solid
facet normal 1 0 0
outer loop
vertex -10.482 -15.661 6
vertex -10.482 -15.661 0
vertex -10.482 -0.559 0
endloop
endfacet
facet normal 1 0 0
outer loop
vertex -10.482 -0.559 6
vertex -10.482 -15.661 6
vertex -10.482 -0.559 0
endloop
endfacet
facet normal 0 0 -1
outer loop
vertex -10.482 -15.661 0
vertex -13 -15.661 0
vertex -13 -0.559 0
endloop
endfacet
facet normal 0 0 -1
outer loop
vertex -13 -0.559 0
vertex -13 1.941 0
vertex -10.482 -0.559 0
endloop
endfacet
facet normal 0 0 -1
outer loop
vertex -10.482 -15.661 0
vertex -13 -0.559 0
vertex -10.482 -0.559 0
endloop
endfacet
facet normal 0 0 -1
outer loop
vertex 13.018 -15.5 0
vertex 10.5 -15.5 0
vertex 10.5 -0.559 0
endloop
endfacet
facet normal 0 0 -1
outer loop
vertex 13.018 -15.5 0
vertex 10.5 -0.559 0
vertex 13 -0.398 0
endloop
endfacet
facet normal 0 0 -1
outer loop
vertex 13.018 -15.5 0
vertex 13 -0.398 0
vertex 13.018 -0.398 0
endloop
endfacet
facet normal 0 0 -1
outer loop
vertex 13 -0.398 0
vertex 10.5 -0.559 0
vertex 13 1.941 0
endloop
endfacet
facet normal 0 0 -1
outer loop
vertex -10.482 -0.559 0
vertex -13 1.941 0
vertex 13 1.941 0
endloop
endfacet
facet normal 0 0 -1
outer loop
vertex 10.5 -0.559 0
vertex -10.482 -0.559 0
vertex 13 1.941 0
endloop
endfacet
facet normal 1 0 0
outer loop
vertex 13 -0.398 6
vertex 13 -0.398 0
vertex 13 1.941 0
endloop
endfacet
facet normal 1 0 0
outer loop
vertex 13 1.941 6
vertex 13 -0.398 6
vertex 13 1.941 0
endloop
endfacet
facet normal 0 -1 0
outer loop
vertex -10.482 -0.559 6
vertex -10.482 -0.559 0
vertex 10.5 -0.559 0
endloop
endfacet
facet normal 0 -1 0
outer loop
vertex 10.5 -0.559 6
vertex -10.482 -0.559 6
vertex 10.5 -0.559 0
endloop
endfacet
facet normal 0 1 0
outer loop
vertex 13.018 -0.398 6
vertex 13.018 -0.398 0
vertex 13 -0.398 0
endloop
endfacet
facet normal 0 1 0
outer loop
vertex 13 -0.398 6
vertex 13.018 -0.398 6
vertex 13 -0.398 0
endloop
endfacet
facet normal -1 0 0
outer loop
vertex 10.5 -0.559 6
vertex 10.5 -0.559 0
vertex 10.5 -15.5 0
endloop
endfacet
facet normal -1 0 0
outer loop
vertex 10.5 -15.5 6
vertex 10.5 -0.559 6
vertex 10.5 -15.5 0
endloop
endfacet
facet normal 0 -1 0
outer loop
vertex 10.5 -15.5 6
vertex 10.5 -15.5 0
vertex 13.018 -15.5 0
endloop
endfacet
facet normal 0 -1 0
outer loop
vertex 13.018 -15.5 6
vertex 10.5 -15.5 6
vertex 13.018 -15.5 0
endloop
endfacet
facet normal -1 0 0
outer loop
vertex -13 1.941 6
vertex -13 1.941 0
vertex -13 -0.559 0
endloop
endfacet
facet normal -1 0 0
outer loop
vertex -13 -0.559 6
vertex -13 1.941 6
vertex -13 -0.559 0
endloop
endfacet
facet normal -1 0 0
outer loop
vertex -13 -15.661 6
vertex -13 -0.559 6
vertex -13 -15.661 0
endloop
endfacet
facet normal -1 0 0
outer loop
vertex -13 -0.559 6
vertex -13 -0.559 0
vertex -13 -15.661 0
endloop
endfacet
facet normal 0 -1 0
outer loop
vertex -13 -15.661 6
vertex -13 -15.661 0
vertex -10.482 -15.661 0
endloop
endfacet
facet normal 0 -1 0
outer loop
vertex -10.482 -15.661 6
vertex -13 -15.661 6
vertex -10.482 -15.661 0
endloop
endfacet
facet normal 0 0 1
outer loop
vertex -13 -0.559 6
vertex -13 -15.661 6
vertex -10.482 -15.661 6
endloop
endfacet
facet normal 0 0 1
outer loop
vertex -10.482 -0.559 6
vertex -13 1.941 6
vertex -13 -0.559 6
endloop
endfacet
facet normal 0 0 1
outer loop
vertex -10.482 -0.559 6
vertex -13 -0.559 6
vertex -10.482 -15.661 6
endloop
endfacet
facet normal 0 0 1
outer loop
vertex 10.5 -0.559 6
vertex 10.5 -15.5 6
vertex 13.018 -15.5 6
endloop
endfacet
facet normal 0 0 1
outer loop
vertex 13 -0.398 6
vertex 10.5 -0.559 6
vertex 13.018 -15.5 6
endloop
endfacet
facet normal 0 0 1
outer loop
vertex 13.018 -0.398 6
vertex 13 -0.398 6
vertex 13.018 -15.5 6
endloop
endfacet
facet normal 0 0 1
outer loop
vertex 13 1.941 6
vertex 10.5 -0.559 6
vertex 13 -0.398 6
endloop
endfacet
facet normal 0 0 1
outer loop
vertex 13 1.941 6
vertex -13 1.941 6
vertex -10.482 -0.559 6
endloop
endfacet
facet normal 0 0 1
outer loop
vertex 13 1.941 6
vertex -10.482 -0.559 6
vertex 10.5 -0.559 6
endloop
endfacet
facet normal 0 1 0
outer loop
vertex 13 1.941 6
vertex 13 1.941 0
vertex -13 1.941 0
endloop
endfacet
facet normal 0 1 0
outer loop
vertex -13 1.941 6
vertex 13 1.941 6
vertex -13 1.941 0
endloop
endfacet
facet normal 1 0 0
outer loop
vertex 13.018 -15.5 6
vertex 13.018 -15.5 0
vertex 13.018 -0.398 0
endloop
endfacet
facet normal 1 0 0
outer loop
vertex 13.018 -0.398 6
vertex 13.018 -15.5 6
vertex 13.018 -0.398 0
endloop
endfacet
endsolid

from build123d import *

# Parameters (mm, degrees)
F0_W     = 2.5180902779
F0_H     = 15.1024697029
F0_W_2   = 2.5
F0_H_2   = 0.1614799052
F1_DEPTH = 6


with BuildPart() as f1:
    # F0 (on Top) → F1 (new body)
    with BuildSketch(Plane.XY):
        Polygon((13, -0.3975302971), (13, 1.9409897977), (-13, 1.9409897977), (-13, -0.5590102023), (-10.4819097221, -0.5590102023), (10.5, -0.5590102023), (10.5, -0.3975302971), align=None)
        with Locations((-11.740954861, -8.1102450538)):
            Rectangle(F0_W, F0_H)
        Polygon((13.0180902779, -0.3975302971), (13, -0.3975302971), (13, -0.5590102023), (10.5, -0.5590102023), (10.5, -15.5), (13.0180902779, -15.5), align=None)
        with Locations((11.75, -0.4782702497)):
            Rectangle(F0_W_2, F0_H_2)
    extrude(amount=F1_DEPTH)


solid = f1.part
